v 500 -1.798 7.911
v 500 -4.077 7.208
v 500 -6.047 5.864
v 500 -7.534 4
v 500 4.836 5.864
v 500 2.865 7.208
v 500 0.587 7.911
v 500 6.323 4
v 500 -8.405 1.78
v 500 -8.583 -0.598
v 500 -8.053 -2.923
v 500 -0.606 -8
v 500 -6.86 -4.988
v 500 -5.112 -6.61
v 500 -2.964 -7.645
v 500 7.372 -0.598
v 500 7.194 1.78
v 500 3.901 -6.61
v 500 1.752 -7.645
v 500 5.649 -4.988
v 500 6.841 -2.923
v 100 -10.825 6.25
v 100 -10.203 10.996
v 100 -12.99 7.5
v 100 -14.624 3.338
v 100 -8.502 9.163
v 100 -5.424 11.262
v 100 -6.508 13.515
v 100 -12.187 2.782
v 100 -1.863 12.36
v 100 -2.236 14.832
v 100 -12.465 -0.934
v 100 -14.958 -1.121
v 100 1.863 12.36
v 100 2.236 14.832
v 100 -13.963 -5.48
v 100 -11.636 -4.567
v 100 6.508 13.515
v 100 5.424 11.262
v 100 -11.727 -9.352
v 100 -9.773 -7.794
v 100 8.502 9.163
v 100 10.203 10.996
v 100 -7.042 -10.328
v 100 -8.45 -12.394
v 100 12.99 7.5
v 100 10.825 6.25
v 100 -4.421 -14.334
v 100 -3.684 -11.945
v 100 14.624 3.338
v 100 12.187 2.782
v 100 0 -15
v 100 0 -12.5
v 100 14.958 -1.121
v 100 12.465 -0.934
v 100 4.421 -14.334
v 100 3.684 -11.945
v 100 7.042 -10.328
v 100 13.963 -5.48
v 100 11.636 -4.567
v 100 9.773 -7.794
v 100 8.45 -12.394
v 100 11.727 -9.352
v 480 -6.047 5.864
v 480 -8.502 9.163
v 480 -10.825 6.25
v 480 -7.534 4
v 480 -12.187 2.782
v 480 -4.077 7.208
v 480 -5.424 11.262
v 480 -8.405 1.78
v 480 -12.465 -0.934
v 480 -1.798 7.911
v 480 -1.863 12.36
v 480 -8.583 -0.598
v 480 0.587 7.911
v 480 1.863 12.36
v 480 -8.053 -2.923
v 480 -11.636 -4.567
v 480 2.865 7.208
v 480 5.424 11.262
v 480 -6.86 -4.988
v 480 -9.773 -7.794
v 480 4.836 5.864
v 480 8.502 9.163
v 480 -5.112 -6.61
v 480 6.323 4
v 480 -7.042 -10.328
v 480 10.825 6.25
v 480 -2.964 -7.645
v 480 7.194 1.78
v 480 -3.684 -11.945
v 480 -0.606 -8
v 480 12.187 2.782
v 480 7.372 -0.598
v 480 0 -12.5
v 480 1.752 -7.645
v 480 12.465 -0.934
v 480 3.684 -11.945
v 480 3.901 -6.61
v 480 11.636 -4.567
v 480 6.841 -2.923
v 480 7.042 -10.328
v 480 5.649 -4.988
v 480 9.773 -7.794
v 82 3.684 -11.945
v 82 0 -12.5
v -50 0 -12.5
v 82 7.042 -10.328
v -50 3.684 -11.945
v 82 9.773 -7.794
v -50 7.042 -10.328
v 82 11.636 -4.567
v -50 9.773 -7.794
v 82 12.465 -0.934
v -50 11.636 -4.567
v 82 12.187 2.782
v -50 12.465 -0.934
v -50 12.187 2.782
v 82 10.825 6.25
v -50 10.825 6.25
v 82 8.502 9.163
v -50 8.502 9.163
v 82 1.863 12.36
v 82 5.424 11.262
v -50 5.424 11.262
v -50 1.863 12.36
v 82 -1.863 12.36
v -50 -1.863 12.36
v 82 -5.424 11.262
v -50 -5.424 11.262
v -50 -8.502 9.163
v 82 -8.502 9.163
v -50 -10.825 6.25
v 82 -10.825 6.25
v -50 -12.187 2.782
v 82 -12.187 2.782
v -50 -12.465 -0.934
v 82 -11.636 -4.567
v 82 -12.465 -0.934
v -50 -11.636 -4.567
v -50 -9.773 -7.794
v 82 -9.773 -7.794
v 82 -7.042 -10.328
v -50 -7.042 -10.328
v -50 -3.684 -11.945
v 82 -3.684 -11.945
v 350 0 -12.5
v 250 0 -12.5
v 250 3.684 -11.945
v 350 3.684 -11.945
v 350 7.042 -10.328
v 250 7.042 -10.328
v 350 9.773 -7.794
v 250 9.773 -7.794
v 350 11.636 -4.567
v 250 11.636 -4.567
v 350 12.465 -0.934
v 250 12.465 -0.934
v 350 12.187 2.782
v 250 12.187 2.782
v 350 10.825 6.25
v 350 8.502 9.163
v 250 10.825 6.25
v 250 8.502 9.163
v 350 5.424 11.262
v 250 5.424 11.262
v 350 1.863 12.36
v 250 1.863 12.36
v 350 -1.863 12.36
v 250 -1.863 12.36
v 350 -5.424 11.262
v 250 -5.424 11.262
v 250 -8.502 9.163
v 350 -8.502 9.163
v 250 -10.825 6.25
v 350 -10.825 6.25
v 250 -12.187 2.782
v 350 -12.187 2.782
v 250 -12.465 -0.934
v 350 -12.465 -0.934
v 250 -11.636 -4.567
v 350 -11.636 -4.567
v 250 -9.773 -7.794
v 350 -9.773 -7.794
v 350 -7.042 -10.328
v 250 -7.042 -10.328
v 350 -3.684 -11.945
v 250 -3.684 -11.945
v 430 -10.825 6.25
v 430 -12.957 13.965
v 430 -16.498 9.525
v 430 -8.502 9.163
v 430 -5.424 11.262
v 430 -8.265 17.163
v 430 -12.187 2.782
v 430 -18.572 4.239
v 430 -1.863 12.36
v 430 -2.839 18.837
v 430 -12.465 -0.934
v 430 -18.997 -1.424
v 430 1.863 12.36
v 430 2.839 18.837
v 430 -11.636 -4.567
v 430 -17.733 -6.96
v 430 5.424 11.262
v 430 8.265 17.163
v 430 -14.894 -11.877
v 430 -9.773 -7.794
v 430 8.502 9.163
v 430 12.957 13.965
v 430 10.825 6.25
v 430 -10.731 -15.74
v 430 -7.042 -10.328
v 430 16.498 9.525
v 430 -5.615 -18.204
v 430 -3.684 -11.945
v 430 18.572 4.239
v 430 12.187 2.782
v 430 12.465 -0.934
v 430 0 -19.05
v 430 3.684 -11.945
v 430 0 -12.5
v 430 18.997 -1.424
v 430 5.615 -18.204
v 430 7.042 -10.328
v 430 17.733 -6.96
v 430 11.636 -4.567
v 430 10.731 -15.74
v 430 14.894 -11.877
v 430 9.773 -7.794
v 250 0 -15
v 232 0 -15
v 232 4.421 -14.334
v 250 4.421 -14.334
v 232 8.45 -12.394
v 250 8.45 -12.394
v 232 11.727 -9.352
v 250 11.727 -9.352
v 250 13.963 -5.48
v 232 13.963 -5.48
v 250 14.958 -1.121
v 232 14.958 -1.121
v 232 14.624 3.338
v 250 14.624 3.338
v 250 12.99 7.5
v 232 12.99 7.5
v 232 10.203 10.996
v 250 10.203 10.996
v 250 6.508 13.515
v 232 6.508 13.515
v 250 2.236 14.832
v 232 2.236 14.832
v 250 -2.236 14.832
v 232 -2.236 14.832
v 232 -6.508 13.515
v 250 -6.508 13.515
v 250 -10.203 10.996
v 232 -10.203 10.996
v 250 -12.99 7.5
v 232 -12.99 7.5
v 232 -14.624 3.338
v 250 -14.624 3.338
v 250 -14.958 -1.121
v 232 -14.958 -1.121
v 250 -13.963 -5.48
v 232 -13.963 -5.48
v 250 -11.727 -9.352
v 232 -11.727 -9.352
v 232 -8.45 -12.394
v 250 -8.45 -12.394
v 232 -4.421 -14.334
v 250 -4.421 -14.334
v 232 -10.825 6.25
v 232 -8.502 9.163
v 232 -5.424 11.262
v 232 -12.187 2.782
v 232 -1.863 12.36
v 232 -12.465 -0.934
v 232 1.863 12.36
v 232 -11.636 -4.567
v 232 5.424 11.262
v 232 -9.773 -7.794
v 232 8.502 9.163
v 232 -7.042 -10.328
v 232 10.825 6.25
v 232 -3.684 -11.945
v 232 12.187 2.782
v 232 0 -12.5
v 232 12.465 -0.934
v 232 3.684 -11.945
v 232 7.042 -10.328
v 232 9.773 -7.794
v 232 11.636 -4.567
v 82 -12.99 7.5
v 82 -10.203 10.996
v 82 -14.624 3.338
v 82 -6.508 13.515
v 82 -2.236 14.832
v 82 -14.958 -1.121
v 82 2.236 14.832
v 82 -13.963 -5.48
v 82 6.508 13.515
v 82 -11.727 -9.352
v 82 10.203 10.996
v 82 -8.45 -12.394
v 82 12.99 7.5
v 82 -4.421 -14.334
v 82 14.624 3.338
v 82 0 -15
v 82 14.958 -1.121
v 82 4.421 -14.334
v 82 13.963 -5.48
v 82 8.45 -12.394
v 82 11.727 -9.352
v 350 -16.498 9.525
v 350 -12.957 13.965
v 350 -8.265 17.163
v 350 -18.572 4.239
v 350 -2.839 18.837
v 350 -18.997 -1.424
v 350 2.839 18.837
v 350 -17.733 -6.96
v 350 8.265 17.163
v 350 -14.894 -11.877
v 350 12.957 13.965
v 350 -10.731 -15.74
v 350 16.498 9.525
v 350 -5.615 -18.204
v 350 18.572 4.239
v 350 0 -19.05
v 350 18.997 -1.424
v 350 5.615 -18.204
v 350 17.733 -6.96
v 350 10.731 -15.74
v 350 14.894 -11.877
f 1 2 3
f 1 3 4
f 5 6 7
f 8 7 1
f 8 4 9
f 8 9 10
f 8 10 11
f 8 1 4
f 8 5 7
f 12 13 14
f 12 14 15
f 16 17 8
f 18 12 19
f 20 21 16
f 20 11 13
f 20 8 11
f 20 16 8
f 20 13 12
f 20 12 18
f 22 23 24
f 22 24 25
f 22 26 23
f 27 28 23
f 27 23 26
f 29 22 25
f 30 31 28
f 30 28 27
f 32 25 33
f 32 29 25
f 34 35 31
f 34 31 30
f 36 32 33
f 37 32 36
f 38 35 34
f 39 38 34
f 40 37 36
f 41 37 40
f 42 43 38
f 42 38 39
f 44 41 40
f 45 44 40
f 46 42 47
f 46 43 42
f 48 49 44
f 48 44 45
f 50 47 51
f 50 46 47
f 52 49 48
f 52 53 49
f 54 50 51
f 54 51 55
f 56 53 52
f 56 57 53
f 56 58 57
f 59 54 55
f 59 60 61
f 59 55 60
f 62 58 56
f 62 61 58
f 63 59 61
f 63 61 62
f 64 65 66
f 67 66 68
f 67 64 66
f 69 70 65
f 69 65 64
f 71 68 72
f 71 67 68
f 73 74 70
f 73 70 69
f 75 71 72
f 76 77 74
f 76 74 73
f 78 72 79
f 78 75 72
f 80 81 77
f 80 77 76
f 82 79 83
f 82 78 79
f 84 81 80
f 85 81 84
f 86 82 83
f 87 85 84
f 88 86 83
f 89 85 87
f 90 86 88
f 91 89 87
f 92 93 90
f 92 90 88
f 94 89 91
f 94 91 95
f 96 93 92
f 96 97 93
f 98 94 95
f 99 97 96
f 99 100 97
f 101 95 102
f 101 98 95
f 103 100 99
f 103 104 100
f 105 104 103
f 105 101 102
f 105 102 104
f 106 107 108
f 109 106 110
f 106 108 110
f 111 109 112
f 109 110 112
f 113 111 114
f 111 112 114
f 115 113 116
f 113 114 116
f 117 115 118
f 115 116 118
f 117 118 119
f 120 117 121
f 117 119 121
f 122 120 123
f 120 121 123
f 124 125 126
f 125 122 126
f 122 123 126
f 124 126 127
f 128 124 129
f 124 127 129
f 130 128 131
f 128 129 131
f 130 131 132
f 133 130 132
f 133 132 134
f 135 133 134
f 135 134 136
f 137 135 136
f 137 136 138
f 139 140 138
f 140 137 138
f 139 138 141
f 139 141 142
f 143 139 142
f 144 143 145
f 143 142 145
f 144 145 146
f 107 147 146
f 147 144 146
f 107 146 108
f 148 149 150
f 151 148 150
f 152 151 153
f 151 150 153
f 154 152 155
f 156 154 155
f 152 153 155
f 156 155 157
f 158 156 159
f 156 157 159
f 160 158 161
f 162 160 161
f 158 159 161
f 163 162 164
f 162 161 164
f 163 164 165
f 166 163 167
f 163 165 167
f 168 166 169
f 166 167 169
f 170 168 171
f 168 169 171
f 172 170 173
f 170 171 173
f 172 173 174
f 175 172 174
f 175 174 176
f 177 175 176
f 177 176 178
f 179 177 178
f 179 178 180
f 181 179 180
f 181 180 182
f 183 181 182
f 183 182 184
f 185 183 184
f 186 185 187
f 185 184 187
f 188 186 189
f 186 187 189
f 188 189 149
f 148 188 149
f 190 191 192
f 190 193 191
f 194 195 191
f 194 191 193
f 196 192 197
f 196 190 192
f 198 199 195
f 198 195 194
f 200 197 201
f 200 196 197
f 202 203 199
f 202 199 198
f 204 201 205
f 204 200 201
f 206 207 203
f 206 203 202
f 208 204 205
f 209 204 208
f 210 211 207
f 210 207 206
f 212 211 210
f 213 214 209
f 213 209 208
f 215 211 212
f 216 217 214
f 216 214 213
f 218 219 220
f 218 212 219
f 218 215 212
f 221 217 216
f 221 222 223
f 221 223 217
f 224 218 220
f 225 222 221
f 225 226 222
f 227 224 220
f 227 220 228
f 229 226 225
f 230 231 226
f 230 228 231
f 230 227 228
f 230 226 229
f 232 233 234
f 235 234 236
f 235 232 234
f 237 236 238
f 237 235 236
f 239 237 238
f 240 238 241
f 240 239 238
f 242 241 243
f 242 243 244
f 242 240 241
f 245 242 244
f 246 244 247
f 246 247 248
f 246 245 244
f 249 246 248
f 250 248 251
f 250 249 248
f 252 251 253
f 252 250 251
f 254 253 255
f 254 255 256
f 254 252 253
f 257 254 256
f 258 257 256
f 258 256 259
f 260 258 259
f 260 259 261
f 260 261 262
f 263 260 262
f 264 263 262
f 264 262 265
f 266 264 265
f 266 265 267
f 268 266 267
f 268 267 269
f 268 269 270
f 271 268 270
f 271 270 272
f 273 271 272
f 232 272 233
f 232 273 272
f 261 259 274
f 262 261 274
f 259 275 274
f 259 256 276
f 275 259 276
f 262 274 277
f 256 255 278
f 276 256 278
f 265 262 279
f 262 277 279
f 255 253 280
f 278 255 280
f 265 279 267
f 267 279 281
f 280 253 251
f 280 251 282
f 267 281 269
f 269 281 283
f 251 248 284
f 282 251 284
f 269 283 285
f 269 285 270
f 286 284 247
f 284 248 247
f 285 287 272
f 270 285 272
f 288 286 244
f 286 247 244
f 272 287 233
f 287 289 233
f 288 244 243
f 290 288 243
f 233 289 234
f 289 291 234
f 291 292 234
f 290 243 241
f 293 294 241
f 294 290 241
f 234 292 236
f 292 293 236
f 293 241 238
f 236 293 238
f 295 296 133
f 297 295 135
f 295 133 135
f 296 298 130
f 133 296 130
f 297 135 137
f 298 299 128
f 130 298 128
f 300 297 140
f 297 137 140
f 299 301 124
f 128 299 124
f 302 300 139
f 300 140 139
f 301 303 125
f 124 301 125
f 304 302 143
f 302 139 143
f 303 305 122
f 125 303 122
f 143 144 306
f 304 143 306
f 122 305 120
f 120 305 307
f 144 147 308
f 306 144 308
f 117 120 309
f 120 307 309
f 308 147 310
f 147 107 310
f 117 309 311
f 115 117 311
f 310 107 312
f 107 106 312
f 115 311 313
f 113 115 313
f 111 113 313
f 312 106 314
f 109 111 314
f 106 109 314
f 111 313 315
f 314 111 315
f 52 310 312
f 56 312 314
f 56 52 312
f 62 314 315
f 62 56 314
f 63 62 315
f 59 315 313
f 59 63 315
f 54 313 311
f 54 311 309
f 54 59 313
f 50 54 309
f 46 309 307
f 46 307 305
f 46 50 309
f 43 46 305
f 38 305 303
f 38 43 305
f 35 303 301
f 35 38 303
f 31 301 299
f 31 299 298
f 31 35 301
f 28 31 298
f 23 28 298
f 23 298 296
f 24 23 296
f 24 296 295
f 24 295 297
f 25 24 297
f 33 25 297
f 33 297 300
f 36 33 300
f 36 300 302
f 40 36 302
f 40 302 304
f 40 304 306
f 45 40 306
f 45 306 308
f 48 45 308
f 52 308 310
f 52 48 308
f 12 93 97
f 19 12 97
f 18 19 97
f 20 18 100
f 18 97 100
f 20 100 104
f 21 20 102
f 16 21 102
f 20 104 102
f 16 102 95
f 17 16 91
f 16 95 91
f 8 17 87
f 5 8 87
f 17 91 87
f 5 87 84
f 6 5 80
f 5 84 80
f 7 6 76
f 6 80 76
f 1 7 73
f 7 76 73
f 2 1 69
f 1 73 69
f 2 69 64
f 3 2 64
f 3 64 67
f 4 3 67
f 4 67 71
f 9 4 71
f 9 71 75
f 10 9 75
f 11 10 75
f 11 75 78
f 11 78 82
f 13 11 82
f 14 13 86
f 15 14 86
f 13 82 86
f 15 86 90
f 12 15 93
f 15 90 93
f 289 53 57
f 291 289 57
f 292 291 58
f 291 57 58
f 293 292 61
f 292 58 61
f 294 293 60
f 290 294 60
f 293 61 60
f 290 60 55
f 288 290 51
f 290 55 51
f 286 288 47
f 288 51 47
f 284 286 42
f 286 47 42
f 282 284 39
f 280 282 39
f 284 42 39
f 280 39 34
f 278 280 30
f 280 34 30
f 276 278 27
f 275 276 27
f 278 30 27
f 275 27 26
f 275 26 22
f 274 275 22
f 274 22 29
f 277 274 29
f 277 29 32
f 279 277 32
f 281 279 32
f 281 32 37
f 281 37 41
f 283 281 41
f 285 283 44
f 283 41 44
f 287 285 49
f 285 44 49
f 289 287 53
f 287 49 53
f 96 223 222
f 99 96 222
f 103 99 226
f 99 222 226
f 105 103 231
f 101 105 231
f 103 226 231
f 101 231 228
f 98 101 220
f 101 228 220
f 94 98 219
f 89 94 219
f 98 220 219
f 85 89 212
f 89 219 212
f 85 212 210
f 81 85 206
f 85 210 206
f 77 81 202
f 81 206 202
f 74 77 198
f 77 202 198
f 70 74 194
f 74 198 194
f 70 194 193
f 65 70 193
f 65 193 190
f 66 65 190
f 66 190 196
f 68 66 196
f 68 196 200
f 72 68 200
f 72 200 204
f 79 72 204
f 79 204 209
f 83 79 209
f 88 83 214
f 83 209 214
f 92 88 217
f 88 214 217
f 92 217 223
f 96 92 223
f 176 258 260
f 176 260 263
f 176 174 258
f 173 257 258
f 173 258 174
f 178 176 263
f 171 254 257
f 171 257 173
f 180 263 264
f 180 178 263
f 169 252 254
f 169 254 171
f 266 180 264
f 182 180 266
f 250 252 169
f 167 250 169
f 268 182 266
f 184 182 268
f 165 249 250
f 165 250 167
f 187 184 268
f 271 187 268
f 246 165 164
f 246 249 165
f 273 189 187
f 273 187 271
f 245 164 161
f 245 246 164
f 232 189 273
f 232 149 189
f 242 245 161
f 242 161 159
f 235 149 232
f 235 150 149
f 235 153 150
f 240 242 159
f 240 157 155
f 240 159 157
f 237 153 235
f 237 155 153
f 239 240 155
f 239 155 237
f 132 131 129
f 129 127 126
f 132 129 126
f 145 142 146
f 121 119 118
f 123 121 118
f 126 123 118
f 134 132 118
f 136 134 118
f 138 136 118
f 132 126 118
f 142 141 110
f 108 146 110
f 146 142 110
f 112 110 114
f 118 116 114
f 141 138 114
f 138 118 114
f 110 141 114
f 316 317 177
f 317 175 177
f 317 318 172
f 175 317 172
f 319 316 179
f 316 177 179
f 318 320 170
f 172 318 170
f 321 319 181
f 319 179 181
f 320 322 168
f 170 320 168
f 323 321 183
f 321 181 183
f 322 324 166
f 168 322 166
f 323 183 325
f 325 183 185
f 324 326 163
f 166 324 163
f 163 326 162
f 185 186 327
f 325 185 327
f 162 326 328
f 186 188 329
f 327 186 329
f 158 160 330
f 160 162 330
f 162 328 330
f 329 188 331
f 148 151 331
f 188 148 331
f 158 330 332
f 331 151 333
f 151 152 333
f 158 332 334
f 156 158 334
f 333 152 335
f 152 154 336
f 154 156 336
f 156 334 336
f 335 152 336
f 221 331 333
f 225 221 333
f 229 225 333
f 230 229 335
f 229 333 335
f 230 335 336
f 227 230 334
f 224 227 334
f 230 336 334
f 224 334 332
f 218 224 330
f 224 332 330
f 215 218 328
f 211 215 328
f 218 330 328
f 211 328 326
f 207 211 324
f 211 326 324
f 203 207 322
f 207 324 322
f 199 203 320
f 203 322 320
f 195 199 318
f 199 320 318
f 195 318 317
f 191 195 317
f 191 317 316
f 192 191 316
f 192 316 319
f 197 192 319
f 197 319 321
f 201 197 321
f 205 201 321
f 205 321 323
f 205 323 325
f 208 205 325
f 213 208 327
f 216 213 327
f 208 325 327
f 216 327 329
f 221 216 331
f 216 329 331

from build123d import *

# Parameters (mm, degrees)
EXTRUDE_1_DEPTH      = 100
EXTRUDE_1_DEPTH_BACK = 50
SKETCH_1_R           = 12.5
SKETCH_2_R           = 15
EXTRUDE_2_DEPTH      = 18
SKETCH_3_R           = 12.5
EXTRUDE_3_DEPTH      = 132
EXTRUDE_START        = 18
SKETCH_4_R           = 15
EXTRUDE_4_DEPTH      = 18
SKETCH_5_R           = 12.5
EXTRUDE_5_DEPTH      = 100
SKETCH_6_R           = 19.05
EXTRUDE_6_DEPTH      = 80
SKETCH_7_R           = 12.5
EXTRUDE_7_DEPTH      = 50
SKETCH_9_R           = 8
EXTRUDE_8_DEPTH      = 20


with BuildPart() as part:
    # 草图1 → 凸台-拉伸1 (new, two sides: drawn at the far end of the back side and taken through both)
    with BuildSketch(Plane(origin=(0, 0, 0), x_dir=(0, 0, -1), z_dir=(1, 0, 0)).offset(-EXTRUDE_1_DEPTH_BACK)):
        Circle(SKETCH_1_R)
    extrude(amount=EXTRUDE_1_DEPTH + EXTRUDE_1_DEPTH_BACK)

    # 草图2 → 凸台-拉伸2 (add)
    with BuildSketch(Plane(origin=(100, 0, 0), x_dir=(0, 0, -1), z_dir=(1, 0, 0))):
        Circle(SKETCH_2_R)
    extrude(amount=-EXTRUDE_2_DEPTH)

    # 草图3 → 凸台-拉伸3 (add)
    with BuildSketch(Plane(origin=(100, 0, 0), x_dir=(0, 0, -1), z_dir=(1, 0, 0))):
        Circle(SKETCH_3_R)
    extrude(amount=EXTRUDE_3_DEPTH)

    # 草图4 → 凸台-拉伸4 (add)
    with BuildSketch(Plane(origin=(232, 0, 0), x_dir=(0, 0, -1), z_dir=(1, 0, 0)).offset(EXTRUDE_START)):
        Circle(SKETCH_4_R)
    extrude(amount=-EXTRUDE_4_DEPTH)

    # 草图5 → 凸台-拉伸5 (add)
    with BuildSketch(Plane(origin=(250, 0, 0), x_dir=(0, 0, -1), z_dir=(1, 0, 0))):
        Circle(SKETCH_5_R)
    extrude(amount=EXTRUDE_5_DEPTH)

    # 草图6 → 凸台-拉伸6 (add)
    with BuildSketch(Plane(origin=(350, 0, 0), x_dir=(0, 0, -1), z_dir=(1, 0, 0))):
        Circle(SKETCH_6_R)
    extrude(amount=EXTRUDE_6_DEPTH)

    # 草图7 → 凸台-拉伸7 (add)
    with BuildSketch(Plane(origin=(430, 0, 0), x_dir=(0, 0, -1), z_dir=(1, 0, 0))):
        Circle(SKETCH_7_R)
    extrude(amount=EXTRUDE_7_DEPTH)

    # 草图9 → 凸台-拉伸8 (add)
    with BuildSketch(Plane(origin=(480, 0, 0), x_dir=(0, 0, -1), z_dir=(1, 0, 0))):
        with Locations((0, -0.60565557)):
            Circle(SKETCH_9_R)
    extrude(amount=EXTRUDE_8_DEPTH)


solid = part.part
